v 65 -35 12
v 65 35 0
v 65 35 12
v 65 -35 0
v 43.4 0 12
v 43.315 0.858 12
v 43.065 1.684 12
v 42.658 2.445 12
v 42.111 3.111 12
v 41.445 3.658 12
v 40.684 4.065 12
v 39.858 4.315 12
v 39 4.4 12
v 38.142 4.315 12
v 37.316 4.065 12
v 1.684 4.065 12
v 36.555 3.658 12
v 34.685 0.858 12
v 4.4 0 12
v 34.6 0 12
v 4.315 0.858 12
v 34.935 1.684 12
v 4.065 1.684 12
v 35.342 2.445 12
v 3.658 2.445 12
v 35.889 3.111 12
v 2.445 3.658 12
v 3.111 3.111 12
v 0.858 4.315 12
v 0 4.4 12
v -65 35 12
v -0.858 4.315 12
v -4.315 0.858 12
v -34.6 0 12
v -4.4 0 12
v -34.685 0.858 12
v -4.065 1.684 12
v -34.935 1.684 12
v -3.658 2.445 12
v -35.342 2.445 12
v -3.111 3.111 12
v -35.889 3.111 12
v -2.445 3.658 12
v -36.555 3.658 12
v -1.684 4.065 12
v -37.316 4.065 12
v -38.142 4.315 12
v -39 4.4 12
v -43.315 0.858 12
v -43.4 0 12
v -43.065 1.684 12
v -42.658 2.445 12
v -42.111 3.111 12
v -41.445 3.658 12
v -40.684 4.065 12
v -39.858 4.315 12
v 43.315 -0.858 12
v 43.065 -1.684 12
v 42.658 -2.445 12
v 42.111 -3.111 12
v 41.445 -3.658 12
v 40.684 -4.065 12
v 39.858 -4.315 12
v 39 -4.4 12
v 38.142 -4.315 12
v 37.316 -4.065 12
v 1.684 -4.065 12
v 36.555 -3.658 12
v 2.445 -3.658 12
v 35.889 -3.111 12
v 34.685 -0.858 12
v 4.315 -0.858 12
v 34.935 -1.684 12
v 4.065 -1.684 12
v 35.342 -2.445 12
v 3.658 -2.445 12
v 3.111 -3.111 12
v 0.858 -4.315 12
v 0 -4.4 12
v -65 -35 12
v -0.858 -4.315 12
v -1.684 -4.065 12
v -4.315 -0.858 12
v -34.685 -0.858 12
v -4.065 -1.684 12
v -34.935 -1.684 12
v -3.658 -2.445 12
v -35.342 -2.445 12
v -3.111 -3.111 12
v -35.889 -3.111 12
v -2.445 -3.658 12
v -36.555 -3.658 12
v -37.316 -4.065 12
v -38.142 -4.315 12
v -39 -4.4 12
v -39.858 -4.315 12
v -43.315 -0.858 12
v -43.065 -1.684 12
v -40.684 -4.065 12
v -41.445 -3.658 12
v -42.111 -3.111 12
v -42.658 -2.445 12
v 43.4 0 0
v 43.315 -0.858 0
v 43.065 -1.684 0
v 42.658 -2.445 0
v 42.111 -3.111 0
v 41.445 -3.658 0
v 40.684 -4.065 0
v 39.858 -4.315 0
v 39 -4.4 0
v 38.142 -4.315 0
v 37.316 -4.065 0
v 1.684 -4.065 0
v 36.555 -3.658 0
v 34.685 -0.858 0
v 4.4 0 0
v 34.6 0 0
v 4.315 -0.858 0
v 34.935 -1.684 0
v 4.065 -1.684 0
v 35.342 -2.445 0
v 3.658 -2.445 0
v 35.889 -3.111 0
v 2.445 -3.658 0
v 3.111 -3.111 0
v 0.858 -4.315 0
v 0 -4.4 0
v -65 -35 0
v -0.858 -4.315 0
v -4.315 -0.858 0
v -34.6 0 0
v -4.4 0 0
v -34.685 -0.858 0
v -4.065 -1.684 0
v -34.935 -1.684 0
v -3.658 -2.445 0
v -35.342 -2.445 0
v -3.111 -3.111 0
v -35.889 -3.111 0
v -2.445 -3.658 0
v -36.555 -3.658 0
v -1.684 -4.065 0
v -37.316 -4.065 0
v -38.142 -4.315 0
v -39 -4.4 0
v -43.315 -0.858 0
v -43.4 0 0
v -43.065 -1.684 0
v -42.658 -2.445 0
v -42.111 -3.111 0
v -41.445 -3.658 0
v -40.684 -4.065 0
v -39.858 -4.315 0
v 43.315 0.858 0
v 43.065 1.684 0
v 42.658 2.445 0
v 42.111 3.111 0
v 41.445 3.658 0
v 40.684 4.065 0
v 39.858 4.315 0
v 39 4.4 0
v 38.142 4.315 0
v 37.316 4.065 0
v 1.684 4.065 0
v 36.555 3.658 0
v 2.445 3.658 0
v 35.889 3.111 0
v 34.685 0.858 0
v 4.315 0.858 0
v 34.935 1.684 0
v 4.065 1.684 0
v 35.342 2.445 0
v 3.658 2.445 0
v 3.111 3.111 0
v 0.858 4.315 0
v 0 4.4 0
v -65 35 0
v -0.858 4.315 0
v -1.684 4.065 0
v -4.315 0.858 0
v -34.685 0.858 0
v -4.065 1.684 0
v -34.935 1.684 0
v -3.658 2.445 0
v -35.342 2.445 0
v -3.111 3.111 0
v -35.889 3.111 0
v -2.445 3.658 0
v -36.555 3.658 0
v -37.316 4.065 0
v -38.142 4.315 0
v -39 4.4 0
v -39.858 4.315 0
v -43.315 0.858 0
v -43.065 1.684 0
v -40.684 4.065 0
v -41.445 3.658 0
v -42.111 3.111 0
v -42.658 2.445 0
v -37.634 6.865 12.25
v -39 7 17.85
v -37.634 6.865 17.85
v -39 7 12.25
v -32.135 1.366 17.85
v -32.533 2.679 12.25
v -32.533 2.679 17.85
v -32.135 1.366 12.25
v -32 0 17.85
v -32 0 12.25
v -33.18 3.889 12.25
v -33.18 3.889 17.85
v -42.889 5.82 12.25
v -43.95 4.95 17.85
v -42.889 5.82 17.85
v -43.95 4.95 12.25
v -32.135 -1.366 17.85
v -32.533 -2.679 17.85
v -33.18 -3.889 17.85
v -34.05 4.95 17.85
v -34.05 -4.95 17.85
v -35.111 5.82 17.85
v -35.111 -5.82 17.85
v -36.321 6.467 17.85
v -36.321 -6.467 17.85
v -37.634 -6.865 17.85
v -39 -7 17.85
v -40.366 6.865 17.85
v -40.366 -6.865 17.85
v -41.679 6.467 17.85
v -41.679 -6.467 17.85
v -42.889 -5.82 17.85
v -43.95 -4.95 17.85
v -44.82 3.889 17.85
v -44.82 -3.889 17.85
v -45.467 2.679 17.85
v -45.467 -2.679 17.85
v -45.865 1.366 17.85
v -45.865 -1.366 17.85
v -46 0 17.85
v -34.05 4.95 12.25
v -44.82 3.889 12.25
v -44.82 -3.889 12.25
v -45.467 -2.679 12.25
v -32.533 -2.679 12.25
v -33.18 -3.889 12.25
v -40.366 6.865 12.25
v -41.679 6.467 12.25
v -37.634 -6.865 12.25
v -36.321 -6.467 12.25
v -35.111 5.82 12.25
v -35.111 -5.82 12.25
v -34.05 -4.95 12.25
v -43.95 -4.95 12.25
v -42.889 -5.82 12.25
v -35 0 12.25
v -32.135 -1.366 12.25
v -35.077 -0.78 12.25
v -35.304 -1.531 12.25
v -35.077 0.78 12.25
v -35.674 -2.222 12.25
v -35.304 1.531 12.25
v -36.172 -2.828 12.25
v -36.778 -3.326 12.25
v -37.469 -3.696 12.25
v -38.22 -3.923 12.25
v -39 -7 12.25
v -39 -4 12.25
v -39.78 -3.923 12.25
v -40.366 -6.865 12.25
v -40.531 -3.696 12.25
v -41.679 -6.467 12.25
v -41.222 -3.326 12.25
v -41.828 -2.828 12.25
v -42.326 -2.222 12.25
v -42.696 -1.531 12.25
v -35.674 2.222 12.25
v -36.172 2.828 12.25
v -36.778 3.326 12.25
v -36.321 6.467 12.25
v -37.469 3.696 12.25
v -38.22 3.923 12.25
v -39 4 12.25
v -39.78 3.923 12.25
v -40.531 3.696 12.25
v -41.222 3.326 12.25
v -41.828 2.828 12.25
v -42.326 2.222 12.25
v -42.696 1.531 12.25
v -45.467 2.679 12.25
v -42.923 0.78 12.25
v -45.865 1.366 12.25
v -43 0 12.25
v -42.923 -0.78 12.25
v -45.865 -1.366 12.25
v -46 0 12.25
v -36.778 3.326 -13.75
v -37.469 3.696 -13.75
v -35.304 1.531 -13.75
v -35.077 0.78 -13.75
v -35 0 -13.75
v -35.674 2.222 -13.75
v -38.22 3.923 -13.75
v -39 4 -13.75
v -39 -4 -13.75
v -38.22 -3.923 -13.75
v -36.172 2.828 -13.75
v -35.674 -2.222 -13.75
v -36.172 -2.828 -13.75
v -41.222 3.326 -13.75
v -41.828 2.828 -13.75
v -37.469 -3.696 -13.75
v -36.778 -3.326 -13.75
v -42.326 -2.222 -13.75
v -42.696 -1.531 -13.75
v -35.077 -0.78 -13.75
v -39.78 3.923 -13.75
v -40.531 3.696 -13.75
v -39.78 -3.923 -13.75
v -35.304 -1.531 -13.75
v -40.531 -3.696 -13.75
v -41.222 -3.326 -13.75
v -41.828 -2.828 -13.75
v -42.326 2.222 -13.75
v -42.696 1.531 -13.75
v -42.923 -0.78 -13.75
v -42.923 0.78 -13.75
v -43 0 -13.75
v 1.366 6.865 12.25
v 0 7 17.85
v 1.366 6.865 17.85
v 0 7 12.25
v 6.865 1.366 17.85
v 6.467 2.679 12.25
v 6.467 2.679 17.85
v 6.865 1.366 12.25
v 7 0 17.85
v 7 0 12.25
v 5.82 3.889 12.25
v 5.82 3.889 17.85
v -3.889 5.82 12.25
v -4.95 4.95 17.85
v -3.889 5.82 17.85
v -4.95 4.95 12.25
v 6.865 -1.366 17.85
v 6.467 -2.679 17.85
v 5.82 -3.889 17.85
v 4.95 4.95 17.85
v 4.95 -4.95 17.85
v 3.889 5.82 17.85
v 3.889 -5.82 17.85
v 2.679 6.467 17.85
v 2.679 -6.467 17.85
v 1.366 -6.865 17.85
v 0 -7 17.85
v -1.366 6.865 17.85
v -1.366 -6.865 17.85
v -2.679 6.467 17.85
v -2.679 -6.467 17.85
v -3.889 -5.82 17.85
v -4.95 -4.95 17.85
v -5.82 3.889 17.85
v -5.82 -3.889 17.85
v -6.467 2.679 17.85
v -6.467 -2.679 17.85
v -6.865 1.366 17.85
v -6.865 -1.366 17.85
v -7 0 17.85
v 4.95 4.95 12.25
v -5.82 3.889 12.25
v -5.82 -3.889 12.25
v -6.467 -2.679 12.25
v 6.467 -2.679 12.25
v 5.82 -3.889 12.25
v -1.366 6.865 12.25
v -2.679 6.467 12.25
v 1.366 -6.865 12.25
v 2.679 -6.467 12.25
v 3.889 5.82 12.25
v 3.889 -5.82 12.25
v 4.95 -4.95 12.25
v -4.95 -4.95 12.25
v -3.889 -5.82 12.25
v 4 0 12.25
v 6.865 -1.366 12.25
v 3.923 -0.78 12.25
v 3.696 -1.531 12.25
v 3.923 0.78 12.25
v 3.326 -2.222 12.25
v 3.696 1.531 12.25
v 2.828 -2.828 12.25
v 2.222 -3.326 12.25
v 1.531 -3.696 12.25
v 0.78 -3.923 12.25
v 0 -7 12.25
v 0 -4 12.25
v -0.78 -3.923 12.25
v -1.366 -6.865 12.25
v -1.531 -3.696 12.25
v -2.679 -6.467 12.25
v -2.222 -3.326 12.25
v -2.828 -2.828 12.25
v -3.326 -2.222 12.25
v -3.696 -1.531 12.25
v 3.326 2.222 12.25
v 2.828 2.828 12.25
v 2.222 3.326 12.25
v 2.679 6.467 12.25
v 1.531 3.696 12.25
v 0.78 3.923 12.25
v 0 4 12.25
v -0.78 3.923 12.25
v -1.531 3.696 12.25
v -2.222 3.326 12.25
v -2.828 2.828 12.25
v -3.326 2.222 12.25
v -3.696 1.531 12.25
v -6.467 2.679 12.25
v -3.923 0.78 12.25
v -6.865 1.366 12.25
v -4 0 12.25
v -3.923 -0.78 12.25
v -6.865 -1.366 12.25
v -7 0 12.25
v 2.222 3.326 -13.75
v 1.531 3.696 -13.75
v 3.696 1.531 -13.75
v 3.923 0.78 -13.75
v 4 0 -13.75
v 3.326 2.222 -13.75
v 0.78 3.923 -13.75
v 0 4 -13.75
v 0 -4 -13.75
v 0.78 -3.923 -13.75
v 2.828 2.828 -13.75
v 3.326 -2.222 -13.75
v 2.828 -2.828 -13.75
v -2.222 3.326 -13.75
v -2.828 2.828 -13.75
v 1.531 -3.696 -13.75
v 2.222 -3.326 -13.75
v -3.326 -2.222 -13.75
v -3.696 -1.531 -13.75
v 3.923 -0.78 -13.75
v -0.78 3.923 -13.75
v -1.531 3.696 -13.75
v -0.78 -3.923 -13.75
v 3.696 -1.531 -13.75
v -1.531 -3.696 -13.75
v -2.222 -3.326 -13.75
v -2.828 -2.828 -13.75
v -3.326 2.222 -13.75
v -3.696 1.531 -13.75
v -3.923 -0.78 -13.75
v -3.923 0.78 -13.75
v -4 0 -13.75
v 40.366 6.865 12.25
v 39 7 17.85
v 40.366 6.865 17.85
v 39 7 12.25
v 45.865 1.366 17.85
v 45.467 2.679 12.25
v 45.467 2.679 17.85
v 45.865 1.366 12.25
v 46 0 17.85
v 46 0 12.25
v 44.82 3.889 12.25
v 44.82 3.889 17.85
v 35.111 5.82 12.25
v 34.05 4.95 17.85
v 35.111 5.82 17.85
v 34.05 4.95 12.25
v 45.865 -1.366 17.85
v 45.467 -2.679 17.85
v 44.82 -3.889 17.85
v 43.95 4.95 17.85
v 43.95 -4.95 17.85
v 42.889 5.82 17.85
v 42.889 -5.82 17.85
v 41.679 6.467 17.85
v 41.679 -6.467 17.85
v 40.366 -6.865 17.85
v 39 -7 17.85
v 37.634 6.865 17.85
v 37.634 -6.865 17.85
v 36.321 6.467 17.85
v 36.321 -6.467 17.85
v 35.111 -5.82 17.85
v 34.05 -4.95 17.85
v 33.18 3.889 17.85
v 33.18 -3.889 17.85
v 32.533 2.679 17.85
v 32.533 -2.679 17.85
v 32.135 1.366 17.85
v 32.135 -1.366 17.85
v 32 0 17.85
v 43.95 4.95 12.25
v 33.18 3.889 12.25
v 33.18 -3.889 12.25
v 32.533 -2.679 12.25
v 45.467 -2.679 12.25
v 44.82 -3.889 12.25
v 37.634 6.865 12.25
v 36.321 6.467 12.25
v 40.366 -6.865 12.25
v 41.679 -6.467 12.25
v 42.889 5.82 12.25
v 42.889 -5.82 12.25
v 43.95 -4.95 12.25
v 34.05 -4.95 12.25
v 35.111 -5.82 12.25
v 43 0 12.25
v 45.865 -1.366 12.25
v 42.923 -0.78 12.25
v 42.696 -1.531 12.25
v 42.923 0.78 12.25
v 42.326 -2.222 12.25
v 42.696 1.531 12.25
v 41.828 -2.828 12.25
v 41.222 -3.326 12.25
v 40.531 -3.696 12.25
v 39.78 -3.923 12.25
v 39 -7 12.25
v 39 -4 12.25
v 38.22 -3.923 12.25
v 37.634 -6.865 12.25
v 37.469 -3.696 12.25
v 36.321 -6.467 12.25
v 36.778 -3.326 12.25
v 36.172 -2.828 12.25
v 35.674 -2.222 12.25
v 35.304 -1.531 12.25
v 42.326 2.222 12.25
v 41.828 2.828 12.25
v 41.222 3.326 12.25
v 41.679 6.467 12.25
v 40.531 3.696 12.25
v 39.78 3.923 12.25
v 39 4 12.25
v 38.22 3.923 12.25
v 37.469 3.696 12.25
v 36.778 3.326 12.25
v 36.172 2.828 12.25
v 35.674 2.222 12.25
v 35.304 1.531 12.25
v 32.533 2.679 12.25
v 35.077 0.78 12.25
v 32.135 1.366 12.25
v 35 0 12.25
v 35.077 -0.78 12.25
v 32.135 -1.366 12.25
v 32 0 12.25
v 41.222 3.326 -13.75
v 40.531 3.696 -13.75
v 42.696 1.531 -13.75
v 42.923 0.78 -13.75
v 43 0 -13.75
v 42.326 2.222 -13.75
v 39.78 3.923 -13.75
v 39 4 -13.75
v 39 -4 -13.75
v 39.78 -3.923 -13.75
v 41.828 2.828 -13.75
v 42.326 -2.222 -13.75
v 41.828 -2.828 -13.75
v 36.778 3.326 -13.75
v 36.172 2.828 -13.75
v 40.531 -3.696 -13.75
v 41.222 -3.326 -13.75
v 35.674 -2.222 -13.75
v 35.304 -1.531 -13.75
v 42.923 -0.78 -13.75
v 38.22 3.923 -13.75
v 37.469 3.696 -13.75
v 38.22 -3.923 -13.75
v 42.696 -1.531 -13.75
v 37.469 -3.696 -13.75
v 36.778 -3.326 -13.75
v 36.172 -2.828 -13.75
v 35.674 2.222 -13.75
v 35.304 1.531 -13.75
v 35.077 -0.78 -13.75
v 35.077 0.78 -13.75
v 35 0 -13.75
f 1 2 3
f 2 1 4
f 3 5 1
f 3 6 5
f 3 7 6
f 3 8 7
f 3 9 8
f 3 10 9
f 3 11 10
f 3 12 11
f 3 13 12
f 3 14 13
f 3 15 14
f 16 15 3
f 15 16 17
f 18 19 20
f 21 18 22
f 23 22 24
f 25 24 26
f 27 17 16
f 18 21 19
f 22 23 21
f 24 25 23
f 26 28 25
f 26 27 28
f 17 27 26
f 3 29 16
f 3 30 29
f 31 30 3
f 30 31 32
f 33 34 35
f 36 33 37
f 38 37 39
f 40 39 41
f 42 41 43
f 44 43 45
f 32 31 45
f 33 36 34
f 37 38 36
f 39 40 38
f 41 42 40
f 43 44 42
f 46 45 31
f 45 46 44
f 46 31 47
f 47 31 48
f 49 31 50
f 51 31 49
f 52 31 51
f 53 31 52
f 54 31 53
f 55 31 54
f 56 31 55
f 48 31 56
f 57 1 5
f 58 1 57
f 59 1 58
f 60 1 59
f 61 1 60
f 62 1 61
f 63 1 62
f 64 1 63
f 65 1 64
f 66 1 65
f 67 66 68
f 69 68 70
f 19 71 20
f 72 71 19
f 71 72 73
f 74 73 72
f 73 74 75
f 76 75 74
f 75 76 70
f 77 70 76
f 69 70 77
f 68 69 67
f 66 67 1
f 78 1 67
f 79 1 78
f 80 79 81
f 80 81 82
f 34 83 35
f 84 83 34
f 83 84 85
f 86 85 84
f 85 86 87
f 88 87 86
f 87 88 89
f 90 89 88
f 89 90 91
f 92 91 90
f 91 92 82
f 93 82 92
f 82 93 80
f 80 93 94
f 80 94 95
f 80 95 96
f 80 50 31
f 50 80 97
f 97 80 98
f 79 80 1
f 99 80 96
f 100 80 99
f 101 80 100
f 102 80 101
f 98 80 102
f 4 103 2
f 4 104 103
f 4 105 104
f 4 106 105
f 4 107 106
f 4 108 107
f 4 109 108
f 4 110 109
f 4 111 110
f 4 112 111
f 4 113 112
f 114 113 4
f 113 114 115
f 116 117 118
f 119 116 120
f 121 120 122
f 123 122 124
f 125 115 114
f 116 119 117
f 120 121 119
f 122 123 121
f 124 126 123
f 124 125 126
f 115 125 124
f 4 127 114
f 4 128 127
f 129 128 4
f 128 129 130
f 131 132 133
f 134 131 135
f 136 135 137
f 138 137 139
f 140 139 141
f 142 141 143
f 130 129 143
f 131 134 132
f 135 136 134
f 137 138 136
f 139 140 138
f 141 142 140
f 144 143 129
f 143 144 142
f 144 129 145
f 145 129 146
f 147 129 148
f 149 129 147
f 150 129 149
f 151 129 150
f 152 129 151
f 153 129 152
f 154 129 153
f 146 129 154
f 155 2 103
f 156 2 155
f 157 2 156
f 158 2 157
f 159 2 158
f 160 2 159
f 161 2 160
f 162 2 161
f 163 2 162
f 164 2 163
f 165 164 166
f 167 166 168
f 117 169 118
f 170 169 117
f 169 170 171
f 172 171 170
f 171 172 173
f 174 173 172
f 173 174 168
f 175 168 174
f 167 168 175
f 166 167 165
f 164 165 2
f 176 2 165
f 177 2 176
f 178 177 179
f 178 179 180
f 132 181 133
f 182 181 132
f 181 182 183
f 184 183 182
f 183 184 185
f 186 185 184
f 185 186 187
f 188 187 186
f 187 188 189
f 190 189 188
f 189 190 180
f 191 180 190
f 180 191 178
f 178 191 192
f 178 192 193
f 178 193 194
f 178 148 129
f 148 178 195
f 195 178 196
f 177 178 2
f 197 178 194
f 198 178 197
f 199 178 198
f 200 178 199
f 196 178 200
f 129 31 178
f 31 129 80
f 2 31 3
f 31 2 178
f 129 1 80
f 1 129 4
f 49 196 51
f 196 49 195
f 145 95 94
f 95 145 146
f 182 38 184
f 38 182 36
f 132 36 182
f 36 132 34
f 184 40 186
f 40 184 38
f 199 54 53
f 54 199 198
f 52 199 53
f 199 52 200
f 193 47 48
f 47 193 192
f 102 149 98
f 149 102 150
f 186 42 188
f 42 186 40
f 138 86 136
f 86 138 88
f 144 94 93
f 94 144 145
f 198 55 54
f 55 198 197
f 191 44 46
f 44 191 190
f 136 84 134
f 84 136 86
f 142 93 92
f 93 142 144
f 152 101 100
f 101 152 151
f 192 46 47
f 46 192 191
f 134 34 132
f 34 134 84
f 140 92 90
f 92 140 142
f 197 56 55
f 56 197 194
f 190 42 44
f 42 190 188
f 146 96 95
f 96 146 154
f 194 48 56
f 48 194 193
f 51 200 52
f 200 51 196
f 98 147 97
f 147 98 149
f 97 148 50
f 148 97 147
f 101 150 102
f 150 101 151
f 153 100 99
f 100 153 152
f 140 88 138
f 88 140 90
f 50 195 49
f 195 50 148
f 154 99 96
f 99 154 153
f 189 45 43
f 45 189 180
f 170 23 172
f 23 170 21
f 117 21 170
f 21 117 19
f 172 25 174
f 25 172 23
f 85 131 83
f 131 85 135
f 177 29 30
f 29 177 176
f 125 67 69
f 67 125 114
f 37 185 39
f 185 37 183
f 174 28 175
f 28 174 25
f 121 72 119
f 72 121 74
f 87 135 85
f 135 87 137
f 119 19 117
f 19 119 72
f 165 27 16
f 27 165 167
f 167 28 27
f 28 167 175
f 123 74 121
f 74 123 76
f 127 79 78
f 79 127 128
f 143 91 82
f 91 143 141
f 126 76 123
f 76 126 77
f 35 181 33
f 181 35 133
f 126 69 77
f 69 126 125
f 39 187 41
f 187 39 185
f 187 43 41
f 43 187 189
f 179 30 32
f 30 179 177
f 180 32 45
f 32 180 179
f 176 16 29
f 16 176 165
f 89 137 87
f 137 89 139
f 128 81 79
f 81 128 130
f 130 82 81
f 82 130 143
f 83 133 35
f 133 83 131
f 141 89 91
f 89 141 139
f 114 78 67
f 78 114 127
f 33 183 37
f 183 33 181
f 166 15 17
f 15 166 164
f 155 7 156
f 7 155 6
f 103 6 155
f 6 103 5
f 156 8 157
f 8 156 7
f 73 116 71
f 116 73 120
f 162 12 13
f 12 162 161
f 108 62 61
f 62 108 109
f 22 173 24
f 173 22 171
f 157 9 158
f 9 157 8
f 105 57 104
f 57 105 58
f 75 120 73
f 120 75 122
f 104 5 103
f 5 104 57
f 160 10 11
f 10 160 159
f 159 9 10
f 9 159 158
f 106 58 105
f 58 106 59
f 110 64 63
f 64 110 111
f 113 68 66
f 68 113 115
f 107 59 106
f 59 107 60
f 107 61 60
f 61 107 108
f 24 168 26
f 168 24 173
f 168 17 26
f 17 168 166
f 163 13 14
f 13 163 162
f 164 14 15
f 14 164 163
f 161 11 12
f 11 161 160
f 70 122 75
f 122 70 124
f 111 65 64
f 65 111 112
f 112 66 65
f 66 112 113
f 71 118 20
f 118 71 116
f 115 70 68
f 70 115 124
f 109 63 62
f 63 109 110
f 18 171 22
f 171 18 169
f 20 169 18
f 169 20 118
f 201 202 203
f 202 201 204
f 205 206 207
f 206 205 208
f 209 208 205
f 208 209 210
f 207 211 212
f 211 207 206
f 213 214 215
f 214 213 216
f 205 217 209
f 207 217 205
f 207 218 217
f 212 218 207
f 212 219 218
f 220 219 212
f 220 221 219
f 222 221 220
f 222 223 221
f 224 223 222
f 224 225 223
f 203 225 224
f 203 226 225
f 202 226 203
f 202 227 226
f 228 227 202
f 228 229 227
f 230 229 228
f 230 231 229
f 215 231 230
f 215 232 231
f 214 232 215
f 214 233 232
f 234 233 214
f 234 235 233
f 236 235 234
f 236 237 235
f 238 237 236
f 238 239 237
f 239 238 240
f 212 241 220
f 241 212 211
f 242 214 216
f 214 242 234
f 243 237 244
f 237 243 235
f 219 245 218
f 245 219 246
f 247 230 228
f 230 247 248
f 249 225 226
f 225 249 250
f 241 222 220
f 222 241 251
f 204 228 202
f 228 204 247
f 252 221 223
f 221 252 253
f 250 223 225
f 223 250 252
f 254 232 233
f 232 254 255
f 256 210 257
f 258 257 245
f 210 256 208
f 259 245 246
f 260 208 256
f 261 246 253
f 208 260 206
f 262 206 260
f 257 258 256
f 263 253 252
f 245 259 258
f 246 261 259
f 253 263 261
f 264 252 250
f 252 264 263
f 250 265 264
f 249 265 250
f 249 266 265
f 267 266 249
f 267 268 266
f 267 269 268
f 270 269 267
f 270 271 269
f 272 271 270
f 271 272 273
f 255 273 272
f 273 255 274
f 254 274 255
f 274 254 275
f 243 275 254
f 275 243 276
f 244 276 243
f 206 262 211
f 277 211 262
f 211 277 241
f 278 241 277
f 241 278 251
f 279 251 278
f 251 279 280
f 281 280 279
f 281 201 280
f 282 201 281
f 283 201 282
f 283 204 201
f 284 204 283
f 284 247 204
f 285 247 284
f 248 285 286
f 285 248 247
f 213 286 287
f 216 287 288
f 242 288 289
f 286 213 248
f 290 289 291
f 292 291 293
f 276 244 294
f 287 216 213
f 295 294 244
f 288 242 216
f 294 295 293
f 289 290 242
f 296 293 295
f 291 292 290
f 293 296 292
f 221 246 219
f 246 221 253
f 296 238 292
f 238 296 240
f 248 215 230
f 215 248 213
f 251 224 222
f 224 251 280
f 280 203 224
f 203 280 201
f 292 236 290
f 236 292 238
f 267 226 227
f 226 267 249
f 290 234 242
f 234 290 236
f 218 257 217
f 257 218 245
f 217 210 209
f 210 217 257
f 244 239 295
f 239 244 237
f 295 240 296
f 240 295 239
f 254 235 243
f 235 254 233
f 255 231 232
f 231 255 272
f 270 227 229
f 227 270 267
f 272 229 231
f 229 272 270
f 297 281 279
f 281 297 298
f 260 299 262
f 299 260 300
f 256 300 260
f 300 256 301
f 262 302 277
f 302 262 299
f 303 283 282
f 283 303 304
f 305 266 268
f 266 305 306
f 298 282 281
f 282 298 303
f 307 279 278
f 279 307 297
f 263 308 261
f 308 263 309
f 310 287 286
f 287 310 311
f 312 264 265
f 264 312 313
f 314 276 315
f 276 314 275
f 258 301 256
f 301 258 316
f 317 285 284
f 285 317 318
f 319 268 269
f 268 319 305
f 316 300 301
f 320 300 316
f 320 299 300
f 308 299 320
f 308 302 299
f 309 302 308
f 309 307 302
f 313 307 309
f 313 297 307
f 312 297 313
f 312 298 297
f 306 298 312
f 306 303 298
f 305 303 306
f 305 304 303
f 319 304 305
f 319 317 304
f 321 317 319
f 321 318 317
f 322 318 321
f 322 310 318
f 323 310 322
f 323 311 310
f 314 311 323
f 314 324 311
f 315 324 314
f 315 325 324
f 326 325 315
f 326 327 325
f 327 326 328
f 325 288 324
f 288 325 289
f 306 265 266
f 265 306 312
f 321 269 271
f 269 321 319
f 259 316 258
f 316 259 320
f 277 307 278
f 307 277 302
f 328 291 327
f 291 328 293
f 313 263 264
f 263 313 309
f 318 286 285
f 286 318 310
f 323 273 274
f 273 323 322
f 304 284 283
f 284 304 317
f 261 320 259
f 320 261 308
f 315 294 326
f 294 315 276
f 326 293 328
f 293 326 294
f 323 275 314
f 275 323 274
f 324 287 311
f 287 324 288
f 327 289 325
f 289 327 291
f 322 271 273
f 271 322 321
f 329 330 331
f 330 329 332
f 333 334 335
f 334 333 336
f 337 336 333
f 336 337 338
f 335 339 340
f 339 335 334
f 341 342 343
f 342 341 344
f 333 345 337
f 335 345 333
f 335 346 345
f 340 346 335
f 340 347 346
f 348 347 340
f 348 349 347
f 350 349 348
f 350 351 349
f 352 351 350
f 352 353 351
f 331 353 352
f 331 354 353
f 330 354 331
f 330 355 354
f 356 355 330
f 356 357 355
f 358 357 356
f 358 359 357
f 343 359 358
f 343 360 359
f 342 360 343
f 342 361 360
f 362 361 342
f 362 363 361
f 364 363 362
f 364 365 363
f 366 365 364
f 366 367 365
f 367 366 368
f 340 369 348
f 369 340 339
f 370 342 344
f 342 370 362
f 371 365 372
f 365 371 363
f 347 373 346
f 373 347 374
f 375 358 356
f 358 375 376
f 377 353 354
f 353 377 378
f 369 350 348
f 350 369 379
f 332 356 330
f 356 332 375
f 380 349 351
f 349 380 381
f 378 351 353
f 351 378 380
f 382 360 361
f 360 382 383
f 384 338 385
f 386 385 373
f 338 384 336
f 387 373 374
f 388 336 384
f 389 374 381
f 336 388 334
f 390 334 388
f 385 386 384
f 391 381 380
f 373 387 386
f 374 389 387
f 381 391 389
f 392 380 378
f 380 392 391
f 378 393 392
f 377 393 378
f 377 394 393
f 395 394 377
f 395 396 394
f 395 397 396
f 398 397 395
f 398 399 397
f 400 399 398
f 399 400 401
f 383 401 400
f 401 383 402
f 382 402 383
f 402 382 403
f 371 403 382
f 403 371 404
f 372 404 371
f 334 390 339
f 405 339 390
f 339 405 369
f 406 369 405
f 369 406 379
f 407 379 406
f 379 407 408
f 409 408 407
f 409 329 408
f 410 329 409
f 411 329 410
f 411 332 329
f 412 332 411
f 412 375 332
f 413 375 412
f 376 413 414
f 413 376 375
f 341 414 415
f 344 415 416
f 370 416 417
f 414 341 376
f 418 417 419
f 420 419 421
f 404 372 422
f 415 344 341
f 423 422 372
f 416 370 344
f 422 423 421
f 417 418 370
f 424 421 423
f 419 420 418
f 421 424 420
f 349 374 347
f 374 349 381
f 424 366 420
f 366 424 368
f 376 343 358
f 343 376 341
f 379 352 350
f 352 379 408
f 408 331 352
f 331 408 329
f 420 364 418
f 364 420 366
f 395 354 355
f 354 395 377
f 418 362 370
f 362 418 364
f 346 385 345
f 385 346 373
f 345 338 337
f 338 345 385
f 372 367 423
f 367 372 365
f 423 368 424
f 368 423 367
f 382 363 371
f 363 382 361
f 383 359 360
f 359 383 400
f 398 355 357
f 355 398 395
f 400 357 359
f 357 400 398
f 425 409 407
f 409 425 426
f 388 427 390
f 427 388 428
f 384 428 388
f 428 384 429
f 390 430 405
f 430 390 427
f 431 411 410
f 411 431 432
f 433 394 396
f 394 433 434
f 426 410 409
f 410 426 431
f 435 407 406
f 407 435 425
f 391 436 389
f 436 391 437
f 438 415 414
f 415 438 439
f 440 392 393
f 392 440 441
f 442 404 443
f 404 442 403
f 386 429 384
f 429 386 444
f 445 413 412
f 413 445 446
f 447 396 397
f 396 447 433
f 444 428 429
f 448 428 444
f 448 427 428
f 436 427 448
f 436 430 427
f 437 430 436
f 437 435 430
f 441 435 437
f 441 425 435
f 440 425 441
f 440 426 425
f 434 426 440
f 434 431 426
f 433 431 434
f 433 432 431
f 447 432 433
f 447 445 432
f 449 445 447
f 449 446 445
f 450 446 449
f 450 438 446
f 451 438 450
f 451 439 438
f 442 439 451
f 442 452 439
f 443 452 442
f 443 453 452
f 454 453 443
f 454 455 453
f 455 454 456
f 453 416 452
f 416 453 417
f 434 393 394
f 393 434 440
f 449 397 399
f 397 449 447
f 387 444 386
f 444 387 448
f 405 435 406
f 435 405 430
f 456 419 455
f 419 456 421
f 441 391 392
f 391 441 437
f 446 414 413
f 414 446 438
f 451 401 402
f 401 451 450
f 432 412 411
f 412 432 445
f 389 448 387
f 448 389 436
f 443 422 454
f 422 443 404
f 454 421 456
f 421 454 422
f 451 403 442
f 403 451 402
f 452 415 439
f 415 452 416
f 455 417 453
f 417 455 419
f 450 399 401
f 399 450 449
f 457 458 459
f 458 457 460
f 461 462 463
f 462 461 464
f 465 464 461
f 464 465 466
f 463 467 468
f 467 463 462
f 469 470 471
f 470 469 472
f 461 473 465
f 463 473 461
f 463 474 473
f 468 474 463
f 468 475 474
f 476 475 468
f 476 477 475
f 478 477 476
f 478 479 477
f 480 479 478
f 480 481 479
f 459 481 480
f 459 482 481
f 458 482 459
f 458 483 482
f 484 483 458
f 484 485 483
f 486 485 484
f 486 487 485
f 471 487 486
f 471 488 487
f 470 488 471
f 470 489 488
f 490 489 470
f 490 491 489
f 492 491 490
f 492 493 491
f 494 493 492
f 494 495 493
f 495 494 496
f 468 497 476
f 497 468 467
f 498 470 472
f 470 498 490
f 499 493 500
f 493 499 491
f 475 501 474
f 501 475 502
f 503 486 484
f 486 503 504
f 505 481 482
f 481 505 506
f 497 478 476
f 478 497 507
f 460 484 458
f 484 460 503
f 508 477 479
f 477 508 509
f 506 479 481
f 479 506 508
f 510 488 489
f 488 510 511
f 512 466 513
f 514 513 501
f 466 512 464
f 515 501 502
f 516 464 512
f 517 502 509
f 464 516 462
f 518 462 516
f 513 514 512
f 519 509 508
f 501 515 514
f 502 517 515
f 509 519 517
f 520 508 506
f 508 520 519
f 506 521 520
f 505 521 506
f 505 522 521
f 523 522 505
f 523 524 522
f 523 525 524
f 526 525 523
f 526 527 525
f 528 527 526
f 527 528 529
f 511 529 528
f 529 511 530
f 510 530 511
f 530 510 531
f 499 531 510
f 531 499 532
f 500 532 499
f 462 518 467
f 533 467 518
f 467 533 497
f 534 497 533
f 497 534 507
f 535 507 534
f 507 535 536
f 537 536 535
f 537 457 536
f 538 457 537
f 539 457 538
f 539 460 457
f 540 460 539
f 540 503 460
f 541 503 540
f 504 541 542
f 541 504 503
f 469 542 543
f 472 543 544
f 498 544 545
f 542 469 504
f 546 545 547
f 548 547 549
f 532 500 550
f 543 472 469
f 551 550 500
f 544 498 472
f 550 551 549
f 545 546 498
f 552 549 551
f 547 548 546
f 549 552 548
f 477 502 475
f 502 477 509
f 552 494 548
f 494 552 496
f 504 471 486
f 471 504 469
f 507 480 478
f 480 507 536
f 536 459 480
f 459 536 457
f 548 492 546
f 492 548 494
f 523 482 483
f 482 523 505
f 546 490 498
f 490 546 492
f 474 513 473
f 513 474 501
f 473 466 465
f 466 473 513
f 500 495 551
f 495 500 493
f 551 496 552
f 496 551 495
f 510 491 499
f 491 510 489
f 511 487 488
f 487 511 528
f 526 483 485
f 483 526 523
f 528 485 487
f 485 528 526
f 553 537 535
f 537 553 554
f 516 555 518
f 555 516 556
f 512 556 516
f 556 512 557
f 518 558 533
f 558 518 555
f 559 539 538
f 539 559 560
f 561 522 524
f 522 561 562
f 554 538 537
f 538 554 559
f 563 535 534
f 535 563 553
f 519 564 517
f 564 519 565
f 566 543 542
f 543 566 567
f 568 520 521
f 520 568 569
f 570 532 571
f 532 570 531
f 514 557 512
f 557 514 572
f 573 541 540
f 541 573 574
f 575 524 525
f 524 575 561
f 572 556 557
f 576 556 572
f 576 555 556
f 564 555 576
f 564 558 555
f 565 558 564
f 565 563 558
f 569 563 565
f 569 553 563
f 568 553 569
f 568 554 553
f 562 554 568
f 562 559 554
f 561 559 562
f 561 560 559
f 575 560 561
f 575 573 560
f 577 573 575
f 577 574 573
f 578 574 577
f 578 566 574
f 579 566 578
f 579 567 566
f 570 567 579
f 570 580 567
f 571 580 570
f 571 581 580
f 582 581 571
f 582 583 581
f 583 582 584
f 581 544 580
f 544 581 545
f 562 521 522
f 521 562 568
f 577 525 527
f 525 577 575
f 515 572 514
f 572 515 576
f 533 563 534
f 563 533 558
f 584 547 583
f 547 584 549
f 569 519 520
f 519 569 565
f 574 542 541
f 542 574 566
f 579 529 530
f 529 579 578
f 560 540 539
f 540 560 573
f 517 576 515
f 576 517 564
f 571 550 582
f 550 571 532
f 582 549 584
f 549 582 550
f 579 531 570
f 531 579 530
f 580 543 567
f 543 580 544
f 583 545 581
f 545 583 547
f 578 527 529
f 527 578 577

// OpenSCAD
$fn = 32;

// ------------------------------------------------------------------------
// Bolted plate: 130 x 70 x 12 mm plate, 3 fasteners
// Every part is its own module, assembly() places them once.
// ------------------------------------------------------------------------

// --- part 1 ---
module plate() {
  difference() {
    translate([-65, -35, 0]) cube([130, 70, 12]);
    translate([-39, 0, -1]) cylinder(h = 14, d = 8.8);
    translate([0, 0, -1]) cylinder(h = 14, d = 8.8);
    translate([39, 0, -1]) cylinder(h = 14, d = 8.8);
  }
}

// --- part 2 ---
module bolt1() {
  cylinder(h = 5.6, d = 14);
  translate([0, 0, -26]) cylinder(h = 26, d = 8);
}

// --- part 3 ---
module bolt2() {
  cylinder(h = 5.6, d = 14);
  translate([0, 0, -26]) cylinder(h = 26, d = 8);
}

// --- part 4 ---
module bolt3() {
  cylinder(h = 5.6, d = 14);
  translate([0, 0, -26]) cylinder(h = 26, d = 8);
}

// --- assembly ---
module assembly() {
  translate([0, 0, 0]) rotate([0, 0, 0]) plate();
  translate([-39, 0, 12.25]) rotate([0, 0, 0]) bolt1();
  translate([0, 0, 12.25]) rotate([0, 0, 0]) bolt2();
  translate([39, 0, 12.25]) rotate([0, 0, 0]) bolt3();
}

assembly();
